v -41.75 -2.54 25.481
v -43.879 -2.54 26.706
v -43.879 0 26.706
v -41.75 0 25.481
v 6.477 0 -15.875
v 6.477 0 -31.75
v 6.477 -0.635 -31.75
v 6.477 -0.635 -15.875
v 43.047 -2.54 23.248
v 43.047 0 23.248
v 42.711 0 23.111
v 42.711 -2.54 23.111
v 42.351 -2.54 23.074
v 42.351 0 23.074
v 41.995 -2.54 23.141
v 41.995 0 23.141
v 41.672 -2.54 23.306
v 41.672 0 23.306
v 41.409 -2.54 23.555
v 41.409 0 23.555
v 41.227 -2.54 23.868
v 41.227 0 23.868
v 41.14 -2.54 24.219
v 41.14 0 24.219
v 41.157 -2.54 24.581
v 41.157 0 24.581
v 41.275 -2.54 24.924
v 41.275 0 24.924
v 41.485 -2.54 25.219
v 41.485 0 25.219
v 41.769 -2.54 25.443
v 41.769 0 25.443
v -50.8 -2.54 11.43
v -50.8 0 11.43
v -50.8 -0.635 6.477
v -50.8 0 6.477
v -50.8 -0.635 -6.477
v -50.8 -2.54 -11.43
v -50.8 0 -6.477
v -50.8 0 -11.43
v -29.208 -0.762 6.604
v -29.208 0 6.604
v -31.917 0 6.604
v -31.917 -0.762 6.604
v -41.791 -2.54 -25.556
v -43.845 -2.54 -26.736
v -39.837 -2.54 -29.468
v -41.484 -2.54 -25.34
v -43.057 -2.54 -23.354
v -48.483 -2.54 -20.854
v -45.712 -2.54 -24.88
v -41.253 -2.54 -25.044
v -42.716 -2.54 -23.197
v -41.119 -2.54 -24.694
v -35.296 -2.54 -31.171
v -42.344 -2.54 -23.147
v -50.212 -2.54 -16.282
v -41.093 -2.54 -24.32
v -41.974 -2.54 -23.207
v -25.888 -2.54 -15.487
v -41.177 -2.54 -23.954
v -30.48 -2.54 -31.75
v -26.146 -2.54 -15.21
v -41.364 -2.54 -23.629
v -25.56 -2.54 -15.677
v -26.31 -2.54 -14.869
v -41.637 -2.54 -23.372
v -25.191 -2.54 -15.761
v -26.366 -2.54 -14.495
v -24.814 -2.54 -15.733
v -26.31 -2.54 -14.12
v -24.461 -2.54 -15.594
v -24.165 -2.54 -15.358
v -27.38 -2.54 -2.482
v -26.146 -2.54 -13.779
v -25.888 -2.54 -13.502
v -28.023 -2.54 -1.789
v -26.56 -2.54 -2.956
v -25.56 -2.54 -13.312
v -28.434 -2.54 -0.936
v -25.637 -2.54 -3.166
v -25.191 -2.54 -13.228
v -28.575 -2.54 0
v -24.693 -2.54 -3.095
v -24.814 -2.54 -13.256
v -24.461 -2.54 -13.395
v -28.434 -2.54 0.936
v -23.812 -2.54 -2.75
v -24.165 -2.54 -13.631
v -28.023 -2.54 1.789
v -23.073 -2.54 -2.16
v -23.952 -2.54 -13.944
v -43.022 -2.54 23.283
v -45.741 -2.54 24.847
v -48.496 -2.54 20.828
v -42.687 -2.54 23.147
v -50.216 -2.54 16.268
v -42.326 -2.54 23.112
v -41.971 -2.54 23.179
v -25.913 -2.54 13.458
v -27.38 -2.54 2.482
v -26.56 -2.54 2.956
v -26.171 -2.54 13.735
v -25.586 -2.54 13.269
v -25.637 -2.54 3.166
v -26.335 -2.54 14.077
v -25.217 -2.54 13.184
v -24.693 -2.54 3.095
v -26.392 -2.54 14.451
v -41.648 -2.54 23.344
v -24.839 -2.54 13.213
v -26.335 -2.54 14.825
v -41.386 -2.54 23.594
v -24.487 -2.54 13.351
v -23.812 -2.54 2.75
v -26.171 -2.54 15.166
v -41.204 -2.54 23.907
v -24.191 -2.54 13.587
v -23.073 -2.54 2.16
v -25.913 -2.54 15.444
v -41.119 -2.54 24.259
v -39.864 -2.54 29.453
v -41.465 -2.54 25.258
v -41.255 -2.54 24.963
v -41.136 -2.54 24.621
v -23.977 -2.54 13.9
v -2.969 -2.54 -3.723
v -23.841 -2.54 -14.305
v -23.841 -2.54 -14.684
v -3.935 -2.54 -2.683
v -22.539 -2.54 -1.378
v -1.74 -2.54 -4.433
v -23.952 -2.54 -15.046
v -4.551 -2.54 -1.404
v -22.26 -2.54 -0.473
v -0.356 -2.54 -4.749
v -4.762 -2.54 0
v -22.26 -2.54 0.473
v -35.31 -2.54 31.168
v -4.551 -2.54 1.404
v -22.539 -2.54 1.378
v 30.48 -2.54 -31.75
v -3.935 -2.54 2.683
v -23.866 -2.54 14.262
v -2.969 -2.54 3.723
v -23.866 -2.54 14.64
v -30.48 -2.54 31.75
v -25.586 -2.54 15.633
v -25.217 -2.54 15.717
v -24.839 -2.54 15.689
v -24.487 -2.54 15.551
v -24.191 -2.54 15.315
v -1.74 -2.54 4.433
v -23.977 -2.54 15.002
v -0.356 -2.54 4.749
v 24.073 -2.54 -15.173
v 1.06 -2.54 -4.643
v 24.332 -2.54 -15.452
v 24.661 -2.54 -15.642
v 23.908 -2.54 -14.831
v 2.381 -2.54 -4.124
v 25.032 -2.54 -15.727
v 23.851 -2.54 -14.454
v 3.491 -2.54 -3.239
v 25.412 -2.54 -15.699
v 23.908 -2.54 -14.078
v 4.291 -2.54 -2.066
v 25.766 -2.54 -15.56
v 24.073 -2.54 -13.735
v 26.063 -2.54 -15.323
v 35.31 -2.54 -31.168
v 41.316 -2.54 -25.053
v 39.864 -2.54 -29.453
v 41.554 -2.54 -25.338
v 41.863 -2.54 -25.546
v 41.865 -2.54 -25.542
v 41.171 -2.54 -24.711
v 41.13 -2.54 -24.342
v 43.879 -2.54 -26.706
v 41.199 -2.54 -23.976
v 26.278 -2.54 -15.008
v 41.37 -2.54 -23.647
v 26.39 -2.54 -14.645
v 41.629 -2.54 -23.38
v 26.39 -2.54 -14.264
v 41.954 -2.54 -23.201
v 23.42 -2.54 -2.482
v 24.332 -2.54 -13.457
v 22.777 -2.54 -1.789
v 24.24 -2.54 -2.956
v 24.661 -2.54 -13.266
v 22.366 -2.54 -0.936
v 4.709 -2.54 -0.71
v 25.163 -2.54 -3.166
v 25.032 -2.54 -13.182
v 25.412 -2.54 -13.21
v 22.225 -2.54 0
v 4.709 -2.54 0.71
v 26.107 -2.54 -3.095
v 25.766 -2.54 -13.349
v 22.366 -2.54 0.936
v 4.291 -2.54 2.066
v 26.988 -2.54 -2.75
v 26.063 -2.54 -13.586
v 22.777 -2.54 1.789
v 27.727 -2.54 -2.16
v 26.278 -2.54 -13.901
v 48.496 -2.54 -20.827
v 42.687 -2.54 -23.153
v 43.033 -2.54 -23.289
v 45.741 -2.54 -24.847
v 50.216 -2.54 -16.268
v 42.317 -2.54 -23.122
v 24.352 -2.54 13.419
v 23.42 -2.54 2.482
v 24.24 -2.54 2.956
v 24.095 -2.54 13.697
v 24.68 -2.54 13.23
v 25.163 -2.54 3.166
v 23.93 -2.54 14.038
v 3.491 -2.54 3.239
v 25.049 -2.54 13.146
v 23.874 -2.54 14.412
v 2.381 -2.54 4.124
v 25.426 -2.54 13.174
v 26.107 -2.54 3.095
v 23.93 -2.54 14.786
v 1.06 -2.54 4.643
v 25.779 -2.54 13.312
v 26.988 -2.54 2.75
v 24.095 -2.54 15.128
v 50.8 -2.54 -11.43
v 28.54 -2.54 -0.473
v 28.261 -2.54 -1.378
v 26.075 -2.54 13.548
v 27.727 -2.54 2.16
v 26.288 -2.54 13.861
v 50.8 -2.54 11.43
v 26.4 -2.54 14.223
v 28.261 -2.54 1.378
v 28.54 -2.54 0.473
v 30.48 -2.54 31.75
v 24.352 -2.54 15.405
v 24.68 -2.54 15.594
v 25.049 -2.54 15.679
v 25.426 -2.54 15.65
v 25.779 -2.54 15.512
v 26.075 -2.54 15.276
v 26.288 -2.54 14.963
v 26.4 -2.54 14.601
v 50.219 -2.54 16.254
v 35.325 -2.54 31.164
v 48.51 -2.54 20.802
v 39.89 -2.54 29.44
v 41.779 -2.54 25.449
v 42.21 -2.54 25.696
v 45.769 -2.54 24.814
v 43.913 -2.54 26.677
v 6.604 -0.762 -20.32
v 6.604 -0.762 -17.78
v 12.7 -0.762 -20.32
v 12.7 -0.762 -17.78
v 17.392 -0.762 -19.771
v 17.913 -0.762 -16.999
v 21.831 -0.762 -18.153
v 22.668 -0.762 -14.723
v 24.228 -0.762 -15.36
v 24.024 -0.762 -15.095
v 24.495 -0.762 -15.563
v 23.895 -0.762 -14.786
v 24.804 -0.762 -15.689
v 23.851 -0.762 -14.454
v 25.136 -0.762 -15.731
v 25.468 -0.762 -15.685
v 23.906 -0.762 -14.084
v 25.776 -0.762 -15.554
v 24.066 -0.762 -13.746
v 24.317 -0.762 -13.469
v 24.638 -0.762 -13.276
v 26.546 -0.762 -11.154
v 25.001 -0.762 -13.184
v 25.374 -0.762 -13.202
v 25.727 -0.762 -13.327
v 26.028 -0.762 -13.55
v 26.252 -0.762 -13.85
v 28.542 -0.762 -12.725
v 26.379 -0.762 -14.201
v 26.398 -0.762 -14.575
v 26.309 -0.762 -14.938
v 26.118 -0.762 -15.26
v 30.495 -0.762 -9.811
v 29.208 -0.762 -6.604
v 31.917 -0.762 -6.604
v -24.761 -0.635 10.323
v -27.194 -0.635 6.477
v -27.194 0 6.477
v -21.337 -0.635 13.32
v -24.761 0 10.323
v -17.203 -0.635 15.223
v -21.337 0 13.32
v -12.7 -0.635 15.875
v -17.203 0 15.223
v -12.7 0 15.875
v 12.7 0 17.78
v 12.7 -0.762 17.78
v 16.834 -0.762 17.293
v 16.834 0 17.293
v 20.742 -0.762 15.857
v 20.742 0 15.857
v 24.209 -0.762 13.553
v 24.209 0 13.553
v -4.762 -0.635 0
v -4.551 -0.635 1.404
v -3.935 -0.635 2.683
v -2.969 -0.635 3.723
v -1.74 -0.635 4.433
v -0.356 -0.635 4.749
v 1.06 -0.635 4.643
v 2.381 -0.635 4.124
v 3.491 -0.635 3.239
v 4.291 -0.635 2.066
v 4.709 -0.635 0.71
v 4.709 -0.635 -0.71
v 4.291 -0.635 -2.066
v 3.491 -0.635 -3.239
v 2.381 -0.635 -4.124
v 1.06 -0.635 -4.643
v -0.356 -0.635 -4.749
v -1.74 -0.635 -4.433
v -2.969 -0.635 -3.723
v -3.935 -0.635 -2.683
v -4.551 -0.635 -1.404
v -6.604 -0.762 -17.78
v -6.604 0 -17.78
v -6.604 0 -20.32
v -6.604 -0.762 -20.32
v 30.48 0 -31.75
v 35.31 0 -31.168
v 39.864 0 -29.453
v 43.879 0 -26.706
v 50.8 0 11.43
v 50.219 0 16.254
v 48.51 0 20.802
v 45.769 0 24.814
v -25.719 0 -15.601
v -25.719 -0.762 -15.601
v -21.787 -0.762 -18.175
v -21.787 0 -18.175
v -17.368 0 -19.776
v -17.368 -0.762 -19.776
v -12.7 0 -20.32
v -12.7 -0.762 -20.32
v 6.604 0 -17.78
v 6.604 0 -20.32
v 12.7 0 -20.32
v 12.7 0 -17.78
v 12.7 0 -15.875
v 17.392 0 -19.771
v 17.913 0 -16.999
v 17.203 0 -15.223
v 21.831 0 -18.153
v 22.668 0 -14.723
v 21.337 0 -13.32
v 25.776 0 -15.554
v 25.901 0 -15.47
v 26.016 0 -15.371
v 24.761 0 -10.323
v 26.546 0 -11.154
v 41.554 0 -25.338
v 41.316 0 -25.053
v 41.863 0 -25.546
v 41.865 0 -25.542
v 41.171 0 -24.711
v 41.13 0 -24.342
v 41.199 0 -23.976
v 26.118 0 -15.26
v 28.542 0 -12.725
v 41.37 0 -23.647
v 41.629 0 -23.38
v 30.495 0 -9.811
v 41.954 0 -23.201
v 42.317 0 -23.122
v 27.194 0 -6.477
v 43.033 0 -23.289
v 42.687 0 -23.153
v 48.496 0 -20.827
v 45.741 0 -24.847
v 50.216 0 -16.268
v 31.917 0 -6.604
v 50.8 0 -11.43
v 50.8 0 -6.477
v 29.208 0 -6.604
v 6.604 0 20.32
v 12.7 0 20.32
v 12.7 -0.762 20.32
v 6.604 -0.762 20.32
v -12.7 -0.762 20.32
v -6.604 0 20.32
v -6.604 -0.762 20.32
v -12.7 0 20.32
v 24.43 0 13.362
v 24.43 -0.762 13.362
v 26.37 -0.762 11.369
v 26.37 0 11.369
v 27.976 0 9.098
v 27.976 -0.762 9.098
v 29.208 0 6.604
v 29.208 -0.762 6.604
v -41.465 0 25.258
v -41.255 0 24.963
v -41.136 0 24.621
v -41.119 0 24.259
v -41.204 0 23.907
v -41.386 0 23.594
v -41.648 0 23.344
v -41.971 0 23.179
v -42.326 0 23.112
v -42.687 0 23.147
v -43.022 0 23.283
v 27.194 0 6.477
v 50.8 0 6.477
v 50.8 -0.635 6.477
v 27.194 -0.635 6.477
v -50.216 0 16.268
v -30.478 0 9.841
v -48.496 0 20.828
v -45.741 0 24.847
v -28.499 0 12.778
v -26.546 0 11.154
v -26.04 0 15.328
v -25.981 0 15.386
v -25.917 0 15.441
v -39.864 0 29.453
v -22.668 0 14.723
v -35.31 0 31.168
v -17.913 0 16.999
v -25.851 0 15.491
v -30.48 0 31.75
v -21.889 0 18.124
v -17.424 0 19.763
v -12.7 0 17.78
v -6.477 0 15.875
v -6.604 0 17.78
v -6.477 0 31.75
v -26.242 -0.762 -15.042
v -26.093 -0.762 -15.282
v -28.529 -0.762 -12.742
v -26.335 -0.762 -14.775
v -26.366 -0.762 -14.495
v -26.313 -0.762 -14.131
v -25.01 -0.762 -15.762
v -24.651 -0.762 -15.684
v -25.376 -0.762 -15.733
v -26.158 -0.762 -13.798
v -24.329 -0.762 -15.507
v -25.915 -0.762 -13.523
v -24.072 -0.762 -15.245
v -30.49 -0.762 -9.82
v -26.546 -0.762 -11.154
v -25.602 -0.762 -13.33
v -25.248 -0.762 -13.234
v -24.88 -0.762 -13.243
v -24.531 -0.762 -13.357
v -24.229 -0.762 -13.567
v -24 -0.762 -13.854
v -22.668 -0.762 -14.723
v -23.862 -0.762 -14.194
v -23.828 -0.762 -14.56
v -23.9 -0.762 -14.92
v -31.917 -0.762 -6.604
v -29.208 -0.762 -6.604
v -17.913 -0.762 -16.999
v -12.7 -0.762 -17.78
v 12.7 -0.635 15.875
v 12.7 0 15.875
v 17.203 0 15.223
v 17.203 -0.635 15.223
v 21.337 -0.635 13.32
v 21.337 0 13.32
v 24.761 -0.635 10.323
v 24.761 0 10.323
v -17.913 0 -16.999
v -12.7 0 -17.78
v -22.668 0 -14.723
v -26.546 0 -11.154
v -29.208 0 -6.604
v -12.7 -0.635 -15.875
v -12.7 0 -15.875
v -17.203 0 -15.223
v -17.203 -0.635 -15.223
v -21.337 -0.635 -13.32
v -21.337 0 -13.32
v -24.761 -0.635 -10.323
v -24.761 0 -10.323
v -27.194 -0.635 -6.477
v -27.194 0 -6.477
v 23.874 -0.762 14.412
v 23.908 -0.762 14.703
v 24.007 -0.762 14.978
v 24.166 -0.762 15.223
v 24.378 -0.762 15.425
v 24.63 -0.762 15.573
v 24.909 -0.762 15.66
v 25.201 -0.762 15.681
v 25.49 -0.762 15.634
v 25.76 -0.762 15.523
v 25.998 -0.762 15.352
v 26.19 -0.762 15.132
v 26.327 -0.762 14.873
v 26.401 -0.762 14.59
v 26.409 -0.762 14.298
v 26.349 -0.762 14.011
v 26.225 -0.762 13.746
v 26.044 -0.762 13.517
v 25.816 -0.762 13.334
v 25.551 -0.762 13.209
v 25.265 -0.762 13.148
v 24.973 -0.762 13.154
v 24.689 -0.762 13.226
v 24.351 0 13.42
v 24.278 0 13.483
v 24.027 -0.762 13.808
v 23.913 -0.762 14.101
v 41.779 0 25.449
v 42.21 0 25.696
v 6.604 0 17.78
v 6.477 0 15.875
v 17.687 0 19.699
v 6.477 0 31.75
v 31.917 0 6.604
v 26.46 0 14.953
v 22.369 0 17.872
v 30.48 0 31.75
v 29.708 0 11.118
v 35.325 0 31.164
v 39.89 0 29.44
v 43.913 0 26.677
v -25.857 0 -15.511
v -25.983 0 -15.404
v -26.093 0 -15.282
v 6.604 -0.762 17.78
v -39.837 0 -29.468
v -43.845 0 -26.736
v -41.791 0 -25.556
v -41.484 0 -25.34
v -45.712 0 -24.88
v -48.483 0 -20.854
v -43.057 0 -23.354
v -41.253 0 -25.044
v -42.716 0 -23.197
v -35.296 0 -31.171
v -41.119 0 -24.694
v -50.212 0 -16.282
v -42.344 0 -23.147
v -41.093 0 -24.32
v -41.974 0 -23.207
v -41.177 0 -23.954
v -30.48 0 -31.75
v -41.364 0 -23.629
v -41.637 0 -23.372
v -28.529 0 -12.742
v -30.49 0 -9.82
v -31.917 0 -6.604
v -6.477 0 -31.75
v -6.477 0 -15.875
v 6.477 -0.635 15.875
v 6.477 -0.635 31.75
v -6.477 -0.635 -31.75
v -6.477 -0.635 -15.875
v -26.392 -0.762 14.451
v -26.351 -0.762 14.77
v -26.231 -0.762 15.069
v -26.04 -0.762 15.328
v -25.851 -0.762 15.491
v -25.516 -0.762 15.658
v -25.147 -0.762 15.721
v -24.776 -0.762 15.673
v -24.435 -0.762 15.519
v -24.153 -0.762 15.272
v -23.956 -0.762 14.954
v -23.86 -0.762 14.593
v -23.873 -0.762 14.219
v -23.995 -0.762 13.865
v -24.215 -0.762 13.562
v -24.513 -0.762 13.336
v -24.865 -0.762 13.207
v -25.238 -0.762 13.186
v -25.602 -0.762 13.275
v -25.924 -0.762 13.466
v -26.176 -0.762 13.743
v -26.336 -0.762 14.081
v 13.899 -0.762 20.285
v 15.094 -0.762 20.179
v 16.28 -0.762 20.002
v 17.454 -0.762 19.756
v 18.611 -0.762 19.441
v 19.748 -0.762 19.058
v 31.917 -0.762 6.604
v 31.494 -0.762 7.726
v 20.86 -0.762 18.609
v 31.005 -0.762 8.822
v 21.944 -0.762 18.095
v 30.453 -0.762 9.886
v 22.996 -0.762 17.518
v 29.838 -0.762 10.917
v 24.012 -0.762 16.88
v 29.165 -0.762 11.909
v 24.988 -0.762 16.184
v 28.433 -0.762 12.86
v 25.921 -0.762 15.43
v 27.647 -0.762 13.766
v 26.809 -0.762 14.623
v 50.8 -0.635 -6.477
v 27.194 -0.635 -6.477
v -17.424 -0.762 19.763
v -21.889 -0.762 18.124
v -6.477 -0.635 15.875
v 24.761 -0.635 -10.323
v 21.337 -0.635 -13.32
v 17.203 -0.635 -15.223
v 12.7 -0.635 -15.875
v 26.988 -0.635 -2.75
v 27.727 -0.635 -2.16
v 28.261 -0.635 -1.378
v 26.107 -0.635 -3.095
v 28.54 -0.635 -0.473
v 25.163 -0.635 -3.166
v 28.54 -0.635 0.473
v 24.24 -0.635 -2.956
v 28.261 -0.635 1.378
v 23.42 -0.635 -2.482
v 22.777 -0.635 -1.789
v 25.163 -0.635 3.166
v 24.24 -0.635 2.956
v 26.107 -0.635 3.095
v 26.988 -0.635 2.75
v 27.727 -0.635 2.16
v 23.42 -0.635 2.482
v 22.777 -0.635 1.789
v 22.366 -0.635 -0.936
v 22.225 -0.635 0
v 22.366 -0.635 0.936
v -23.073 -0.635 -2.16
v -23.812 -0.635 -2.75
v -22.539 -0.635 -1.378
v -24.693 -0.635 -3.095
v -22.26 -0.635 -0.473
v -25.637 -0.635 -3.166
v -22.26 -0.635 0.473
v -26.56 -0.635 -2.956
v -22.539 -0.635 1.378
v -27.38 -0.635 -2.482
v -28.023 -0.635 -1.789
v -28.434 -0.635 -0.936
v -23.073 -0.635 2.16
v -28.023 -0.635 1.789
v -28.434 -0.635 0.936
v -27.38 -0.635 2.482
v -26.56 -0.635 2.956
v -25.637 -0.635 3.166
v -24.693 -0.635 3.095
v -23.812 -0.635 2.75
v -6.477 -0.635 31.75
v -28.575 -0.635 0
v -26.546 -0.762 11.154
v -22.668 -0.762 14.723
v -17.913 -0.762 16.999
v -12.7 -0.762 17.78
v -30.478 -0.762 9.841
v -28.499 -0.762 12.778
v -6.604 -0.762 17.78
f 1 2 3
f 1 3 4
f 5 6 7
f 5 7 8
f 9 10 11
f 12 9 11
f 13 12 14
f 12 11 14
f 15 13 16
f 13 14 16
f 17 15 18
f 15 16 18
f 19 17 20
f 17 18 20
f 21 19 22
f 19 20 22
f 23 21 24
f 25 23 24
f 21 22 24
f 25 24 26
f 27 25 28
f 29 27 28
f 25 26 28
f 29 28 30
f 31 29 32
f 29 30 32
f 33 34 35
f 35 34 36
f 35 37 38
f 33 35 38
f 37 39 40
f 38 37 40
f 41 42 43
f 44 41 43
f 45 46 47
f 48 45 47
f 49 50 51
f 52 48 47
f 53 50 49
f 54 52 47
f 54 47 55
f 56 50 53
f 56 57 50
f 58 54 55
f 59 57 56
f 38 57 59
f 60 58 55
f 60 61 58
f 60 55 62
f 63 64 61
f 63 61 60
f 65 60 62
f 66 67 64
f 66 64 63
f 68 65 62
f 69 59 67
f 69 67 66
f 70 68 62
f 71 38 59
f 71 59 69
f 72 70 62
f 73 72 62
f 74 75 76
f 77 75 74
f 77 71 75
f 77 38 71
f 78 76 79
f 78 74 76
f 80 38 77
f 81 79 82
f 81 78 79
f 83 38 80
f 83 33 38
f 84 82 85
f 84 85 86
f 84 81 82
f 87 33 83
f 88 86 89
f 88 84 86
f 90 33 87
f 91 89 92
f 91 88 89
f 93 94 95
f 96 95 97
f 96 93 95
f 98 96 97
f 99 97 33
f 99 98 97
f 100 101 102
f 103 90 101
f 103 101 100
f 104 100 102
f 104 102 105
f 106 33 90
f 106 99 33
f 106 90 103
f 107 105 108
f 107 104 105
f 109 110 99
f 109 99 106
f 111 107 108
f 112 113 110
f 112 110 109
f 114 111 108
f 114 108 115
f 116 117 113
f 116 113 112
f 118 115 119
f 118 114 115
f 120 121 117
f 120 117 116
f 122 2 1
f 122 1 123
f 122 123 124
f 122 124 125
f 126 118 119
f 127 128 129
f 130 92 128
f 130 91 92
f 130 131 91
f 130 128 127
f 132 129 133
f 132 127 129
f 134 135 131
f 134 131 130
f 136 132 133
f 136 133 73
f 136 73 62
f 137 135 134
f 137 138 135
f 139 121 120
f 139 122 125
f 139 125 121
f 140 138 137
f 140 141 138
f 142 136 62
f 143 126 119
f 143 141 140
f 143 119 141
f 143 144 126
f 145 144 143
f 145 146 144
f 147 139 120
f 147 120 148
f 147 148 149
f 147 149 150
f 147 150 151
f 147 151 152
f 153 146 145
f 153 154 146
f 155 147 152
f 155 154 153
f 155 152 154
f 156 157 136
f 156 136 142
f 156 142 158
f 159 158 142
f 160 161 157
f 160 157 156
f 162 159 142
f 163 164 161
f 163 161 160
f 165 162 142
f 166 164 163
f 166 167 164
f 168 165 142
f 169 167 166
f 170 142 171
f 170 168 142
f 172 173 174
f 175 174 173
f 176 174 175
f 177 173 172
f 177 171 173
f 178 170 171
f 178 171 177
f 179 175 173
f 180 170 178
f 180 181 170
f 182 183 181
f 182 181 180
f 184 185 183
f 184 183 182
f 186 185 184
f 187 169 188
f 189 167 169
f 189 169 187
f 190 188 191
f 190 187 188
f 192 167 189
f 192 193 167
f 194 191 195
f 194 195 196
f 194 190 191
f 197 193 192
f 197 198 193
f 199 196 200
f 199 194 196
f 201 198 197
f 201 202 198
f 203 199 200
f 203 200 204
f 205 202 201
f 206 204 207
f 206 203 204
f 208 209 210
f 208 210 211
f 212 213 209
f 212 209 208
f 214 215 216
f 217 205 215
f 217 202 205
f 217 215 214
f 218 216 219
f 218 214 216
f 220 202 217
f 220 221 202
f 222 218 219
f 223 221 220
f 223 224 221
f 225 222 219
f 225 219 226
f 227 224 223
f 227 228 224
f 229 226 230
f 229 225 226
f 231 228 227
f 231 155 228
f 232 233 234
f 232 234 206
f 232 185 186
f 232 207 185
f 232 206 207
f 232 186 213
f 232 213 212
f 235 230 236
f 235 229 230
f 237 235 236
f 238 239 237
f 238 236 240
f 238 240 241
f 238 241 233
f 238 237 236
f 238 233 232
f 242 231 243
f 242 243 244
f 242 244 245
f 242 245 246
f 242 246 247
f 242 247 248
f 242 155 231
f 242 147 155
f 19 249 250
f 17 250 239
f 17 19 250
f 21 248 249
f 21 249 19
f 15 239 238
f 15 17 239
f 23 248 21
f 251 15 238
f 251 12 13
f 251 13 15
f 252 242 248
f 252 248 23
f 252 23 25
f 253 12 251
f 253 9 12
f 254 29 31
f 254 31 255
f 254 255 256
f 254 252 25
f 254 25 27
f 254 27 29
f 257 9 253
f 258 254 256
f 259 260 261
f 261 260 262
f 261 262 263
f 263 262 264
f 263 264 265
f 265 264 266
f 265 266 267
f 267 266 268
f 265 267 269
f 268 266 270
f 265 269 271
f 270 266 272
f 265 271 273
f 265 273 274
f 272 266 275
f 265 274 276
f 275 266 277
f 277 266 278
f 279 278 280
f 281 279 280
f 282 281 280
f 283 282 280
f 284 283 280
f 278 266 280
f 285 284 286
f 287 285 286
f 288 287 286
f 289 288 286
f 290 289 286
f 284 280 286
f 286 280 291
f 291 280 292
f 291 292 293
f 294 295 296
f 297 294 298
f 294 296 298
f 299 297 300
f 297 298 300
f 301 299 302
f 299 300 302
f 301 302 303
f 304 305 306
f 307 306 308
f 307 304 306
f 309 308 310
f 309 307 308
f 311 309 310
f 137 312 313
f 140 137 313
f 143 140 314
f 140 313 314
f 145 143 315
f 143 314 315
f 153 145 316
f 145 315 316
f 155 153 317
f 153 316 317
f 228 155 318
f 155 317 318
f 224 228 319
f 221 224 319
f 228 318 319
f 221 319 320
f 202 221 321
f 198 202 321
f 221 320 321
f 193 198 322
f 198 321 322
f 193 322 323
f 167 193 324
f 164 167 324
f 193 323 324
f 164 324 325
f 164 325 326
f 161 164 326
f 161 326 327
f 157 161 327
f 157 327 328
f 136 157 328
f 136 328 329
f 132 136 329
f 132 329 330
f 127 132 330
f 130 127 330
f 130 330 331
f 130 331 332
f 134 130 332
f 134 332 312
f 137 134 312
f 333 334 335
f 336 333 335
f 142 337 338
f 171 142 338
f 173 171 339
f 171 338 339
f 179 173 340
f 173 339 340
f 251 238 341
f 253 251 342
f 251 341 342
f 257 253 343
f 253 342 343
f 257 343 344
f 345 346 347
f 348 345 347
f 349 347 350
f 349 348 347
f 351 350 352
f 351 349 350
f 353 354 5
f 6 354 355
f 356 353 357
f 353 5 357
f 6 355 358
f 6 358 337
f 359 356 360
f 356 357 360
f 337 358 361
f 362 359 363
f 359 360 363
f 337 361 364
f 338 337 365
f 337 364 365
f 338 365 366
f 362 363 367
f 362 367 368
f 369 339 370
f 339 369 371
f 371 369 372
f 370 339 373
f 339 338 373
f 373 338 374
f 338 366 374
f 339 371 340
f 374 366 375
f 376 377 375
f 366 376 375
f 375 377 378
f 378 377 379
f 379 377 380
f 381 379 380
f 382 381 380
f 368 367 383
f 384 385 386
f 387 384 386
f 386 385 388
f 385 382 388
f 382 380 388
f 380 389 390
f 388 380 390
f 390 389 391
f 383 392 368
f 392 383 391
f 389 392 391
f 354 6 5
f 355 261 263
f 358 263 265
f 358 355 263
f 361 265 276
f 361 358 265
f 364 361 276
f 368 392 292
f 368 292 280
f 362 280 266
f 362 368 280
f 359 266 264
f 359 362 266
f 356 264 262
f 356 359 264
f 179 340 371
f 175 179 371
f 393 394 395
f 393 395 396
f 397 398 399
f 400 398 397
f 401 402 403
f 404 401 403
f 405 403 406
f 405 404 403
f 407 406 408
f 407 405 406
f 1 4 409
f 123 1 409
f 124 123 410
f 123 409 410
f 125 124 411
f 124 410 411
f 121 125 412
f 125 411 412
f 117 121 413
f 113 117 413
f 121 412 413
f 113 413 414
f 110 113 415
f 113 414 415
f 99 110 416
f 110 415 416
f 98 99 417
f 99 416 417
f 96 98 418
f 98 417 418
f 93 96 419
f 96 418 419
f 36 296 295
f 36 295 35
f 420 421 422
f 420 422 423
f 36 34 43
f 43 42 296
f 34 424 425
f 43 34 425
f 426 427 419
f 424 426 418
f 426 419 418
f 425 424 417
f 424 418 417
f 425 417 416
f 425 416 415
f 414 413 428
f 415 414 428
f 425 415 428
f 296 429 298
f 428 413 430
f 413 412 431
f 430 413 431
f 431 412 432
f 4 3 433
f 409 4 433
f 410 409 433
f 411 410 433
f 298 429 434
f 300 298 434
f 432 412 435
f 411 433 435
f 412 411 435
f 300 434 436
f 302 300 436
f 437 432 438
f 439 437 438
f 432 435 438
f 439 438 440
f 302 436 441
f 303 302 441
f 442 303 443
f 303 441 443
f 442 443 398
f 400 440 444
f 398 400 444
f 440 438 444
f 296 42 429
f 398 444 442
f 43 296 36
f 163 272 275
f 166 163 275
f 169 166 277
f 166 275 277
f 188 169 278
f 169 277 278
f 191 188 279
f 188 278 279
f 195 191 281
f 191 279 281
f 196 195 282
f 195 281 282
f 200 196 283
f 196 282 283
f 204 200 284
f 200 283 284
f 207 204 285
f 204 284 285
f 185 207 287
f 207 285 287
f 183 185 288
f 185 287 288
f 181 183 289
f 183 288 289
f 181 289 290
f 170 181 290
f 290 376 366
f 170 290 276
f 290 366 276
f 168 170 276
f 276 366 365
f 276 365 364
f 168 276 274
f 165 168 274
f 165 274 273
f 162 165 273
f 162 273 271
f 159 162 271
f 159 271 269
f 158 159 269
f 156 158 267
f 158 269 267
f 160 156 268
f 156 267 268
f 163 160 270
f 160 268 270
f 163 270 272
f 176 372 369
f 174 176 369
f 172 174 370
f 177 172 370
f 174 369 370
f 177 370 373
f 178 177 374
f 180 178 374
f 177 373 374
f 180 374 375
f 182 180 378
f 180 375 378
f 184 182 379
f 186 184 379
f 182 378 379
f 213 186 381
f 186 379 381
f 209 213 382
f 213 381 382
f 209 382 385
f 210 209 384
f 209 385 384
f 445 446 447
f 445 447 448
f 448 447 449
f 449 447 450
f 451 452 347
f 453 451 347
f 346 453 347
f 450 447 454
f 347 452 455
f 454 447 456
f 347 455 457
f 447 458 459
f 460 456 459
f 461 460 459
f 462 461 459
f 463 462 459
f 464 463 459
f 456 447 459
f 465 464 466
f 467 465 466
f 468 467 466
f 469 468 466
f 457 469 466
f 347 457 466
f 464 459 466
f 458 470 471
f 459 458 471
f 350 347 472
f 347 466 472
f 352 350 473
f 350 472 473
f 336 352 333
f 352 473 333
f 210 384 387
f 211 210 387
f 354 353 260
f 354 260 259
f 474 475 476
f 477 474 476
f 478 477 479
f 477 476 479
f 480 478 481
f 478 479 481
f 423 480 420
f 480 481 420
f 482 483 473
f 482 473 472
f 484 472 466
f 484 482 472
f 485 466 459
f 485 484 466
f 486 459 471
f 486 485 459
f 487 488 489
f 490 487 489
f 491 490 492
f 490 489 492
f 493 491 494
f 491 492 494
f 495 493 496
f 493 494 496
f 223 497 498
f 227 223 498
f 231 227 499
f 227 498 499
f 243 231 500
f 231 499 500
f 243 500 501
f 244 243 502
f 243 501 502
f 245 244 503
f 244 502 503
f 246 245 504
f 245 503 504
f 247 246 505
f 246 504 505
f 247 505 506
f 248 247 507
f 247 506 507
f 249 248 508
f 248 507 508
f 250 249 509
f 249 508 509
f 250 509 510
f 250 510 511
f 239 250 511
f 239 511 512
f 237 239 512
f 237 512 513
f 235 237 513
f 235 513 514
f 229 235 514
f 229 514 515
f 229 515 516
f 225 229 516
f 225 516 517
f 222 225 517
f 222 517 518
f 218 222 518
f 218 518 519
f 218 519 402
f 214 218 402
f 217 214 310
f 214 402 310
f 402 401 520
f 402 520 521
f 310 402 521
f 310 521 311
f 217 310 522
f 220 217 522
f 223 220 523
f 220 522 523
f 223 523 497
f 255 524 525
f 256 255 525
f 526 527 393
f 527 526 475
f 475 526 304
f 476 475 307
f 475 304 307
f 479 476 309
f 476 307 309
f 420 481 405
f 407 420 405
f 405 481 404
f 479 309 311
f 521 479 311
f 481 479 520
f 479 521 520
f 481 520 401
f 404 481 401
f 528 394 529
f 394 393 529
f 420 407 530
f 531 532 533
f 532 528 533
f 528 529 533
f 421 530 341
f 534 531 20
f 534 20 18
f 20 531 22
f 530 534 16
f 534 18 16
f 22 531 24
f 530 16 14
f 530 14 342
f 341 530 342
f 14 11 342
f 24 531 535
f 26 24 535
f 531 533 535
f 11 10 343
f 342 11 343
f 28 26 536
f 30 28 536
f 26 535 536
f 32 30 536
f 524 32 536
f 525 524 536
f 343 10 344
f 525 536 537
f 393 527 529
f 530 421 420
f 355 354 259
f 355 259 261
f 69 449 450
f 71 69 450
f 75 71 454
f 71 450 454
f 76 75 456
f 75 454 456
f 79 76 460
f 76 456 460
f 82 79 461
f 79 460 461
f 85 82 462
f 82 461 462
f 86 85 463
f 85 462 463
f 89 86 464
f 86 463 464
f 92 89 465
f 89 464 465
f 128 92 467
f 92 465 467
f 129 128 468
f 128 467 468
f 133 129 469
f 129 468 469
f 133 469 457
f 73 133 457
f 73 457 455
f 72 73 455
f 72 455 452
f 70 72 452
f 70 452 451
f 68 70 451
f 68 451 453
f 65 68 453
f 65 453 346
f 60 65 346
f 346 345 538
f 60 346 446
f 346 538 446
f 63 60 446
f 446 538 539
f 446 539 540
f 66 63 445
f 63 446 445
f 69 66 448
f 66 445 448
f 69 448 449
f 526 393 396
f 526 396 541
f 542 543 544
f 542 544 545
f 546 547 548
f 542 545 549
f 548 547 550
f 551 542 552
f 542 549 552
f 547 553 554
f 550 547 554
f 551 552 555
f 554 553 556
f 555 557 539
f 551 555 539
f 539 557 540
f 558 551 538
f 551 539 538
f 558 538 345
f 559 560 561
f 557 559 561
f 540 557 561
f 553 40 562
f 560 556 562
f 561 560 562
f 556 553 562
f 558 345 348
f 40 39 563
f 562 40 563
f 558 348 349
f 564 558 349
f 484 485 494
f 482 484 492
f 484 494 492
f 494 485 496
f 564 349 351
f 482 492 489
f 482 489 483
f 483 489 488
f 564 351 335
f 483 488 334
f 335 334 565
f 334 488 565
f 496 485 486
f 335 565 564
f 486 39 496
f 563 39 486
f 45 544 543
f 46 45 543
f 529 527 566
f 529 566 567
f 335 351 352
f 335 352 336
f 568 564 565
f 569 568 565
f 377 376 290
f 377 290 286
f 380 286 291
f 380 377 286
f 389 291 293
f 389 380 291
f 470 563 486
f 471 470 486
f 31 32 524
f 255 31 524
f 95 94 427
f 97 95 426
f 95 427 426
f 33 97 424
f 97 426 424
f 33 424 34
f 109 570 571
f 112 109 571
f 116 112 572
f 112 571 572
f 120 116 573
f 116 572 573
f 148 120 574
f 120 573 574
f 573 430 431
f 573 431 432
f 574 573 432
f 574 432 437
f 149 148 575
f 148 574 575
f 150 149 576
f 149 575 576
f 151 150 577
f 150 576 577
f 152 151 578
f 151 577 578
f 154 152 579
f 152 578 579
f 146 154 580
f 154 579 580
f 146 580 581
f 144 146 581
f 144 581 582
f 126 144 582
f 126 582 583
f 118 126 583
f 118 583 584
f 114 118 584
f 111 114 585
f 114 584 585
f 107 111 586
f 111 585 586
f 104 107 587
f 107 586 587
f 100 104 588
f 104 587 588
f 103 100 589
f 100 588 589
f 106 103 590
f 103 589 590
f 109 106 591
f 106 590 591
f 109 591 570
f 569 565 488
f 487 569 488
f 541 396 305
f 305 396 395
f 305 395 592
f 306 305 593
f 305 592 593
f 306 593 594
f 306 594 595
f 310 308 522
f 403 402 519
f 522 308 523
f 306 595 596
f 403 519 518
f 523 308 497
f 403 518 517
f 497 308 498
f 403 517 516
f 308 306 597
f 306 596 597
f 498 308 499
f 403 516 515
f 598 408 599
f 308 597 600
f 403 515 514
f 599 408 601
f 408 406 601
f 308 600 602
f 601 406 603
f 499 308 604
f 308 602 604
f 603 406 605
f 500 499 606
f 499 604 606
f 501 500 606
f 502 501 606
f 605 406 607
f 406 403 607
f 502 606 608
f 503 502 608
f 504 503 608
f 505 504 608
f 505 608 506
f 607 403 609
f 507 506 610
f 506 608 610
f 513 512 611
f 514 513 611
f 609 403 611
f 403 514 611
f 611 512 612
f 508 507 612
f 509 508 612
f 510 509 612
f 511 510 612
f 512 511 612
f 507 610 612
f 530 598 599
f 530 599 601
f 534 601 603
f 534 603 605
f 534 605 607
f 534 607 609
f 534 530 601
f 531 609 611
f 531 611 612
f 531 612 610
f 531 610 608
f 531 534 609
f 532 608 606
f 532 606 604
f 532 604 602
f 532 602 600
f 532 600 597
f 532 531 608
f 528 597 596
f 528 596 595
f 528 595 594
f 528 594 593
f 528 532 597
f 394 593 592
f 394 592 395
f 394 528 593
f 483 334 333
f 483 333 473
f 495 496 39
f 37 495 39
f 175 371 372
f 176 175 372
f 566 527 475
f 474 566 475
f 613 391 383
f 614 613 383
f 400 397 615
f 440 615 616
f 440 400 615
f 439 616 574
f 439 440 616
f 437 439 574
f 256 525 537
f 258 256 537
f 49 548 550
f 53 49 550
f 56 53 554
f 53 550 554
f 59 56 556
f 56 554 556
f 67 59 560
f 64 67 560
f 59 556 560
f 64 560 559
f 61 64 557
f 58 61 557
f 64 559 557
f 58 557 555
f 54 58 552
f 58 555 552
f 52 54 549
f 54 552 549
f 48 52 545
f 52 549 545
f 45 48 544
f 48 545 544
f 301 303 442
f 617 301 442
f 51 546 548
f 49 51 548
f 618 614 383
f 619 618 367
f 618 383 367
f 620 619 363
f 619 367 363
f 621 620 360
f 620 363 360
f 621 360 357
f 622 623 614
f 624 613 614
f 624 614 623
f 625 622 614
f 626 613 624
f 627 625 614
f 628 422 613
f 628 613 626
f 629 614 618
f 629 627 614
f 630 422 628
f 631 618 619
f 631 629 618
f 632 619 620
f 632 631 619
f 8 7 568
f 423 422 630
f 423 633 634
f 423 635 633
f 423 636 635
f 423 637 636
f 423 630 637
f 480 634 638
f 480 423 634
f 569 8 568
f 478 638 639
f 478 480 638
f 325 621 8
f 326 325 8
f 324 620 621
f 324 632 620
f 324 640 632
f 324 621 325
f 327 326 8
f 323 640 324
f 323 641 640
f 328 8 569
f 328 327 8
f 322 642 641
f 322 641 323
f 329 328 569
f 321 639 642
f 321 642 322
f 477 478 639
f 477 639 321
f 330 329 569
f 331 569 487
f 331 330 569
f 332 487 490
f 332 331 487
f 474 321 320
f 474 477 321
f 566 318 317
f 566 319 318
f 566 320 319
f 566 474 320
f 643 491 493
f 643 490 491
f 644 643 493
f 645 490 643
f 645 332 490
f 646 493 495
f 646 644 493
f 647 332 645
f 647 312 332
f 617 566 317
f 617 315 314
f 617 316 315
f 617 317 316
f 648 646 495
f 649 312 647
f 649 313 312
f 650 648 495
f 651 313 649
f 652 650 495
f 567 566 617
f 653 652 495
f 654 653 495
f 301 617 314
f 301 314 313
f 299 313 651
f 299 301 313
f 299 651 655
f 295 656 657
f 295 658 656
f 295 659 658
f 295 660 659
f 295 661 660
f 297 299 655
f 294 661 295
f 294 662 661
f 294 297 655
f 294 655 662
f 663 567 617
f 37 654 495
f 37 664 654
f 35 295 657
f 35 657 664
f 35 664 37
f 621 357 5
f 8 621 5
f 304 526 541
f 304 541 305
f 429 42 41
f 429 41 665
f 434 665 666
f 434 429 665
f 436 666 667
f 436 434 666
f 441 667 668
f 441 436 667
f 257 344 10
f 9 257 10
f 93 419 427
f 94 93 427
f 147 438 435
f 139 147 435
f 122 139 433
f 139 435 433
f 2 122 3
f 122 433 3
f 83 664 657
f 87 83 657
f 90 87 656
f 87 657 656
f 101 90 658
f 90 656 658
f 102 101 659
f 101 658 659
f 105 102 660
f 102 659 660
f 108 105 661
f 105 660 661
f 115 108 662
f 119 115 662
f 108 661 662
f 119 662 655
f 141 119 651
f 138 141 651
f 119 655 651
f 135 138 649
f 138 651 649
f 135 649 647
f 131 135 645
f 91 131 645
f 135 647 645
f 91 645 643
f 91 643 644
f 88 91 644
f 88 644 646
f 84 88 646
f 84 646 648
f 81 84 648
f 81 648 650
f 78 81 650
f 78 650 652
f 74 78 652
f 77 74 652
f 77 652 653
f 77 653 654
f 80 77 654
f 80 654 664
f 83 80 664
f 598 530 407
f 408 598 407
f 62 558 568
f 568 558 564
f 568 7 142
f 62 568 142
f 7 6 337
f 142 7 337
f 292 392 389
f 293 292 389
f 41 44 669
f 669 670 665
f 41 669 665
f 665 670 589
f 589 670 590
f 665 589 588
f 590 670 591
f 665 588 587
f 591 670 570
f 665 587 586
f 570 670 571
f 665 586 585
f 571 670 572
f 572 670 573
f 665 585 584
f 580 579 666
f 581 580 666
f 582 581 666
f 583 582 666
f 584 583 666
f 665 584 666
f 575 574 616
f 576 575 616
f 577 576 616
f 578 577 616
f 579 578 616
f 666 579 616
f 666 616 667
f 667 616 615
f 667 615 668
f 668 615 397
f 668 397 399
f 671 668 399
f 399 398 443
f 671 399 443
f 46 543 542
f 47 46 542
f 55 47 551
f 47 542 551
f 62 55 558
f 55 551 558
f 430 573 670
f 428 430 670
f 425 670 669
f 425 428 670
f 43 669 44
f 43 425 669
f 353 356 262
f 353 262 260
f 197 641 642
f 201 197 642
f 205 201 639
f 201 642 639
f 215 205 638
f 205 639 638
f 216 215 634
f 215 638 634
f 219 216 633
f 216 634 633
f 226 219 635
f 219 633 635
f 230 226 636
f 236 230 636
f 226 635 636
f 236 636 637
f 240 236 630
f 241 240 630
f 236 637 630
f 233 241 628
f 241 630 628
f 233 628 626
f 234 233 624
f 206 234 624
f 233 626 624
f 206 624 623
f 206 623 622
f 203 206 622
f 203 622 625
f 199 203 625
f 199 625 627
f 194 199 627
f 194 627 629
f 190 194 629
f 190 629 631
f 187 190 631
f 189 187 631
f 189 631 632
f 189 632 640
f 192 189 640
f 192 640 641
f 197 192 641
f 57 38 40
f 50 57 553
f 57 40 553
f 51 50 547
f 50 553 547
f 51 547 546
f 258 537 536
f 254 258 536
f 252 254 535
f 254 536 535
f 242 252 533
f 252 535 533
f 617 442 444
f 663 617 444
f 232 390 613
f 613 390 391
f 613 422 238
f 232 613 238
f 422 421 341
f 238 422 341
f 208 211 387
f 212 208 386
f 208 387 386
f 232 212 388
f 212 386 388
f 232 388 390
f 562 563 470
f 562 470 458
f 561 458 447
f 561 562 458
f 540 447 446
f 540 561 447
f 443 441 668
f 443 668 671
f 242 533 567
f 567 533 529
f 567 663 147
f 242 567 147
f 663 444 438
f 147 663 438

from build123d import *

# Parameters (mm, degrees)
F1_DEPTH  = 2.54
F3_DEPTH  = 12.7
F5_DEPTH  = 52.071
F7_DEPTH  = 76.2
F9_DEPTH  = 25.4
F10_W     = 50.673
F10_H     = 12.954
F10_W_2   = 12.954
F10_H_2   = 37.973
F11_DEPTH = 0.635
F12_DEPTH = 13.462
F14_DEPTH = 1.905
F15_R     = 4.7625
F15_R_2   = 3.175
F16_DEPTH = 25.4
F17_R     = 1.2763153823
F17_R_2   = 1.27
F18_DEPTH = 25.4


# Not quite as in the source:
# - ends of sketch curves that miss each other by under 0.0002 mm in the source are joined


with BuildPart() as f1:
    # F0 (on Front) → F1 (new body)
    with BuildSketch(Plane.XZ):
        with BuildLine():
            Line((30.48, 31.75), (-30.48, 31.75))
            ThreePointArc((-30.48, 31.75), (-44.8484097937, 25.7984097937), (-50.8, 11.43))
            Line((-50.8, 11.43), (-50.8, -11.43))
            ThreePointArc((-50.8, -11.43), (-44.8484097937, -25.7984097937), (-30.48, -31.75))
            Line((-30.48, -31.75), (30.48, -31.75))
            ThreePointArc((30.48, -31.75), (44.8484097937, -25.7984097937), (50.8, -11.43))
            Line((50.8, -11.43), (50.8, 11.43))
            ThreePointArc((50.8, 11.43), (44.8484097937, 25.7984097937), (30.48, 31.75))
        make_face()
    extrude(amount=F1_DEPTH)

    # F2 (on Front) → F3 (join)
    with BuildSketch(Plane.XZ):
        with BuildLine():
            ThreePointArc((33.02, 0), (27.0684097937, 14.3684097937), (12.7, 20.32))
            Line((12.7, 20.32), (-12.7, 20.32))
            ThreePointArc((-12.7, 20.32), (-27.0684097937, 14.3684097937), (-33.02, 0))
            ThreePointArc((-33.02, 0), (-27.0684097937, -14.3684097937), (-12.7, -20.32))
            Line((-12.7, -20.32), (12.7, -20.32))
            ThreePointArc((12.7, -20.32), (27.0684097937, -14.3684097937), (33.02, 0))
        make_face()
        with BuildLine():
            ThreePointArc((-30.48, 0), (-25.2723585695, 12.5723585695), (-12.7, 17.78))
            Line((-12.7, 17.78), (12.7, 17.78))
            ThreePointArc((12.7, 17.78), (25.2723585695, 12.5723585695), (30.48, 0))
            ThreePointArc((30.48, 0), (25.2723585695, -12.5723585695), (12.7, -17.78))
            Line((12.7, -17.78), (-12.7, -17.78))
            ThreePointArc((-12.7, -17.78), (-25.2723585695, -12.5723585695), (-30.48, 0))
        make_face(mode=Mode.SUBTRACT)
    extrude(amount=-F3_DEPTH)

    # F4 (on face) → F5 (cut, through all)
    with BuildSketch(Plane.XY.offset(20.32)):
        Polygon((6.604, 12.7), (0, 12.7), (-6.604, 12.7), (-6.604, 0), (6.604, 0), align=None)
    extrude(amount=-F5_DEPTH, mode=Mode.SUBTRACT)

    # F6 (on Right) → F7 (cut, symmetric)
    with BuildSketch(Plane.YZ):
        Polygon((0, 6.604), (0, 0), (0, -6.604), (12.7, -6.604), (12.7, 6.604), align=None)
    extrude(amount=F7_DEPTH, both=True, mode=Mode.SUBTRACT)

    # F8 (on face) → F9 (cut)
    with BuildSketch(Plane(origin=(0, 0, 0), x_dir=(-1, 0, 0), z_dir=(0, 1, 0))):
        with BuildLine():
            Line((12.7, 15.875), (-12.7, 15.875))
            ThreePointArc((-12.7, 15.875), (-23.9253201513, 11.2253201513), (-28.575, 0))
            ThreePointArc((-28.575, 0), (-23.9253201513, -11.2253201513), (-12.7, -15.875))
            Line((-12.7, -15.875), (12.7, -15.875))
            ThreePointArc((12.7, -15.875), (23.9253201513, -11.2253201513), (28.575, 0))
            ThreePointArc((28.575, 0), (23.9253201513, 11.2253201513), (12.7, 15.875))
        make_face()
    extrude(amount=-F9_DEPTH, mode=Mode.SUBTRACT)

    # F10 (on face) → F11 (cut)
    with BuildSketch(Plane(origin=(0, 0, 0), x_dir=(-1, 0, 0), z_dir=(0, 1, 0))):
        with Locations((-31.8135, 0)):
            Rectangle(F10_W, F10_H)
        with Locations((0, 25.4635)):
            Rectangle(F10_W_2, F10_H_2)
        Rectangle(F10_W_2, F10_H)
        with Locations((31.8135, 0)):
            Rectangle(F10_W, F10_H)
        with Locations((0, -25.4635)):
            Rectangle(F10_W_2, F10_H_2)
    extrude(amount=-F11_DEPTH, mode=Mode.SUBTRACT)

    # F12 (cut): faces of the model
    f12_faces = [f1.faces().sort_by_distance(p)[0] for p in [
        (9.652, 12.7, -20.0320986266),
        (30.5624774214, 12.7, 6.8919013734),
        (-30.5624774214, 12.7, -6.8919013734),
        (-6.8919013734, 12.7, 19.05),
    ]]
    extrude(f12_faces, amount=-F12_DEPTH, mode=Mode.SUBTRACT)

    # F13 (on face) → F14 (join)
    with BuildSketch(Plane.XZ.offset(2.54)):
        with BuildLine():
            Line((-12.7, -15.875), (12.7, -15.875))
            ThreePointArc((12.7, -15.875), (23.9253201513, -11.2253201513), (28.575, 0))
            ThreePointArc((28.575, 0), (23.9253201513, 11.2253201513), (12.7, 15.875))
            Line((12.7, 15.875), (-12.7, 15.875))
            ThreePointArc((-12.7, 15.875), (-23.9253201513, 11.2253201513), (-28.575, 0))
            ThreePointArc((-28.575, 0), (-23.9253201513, -11.2253201513), (-12.7, -15.875))
        make_face()
    extrude(amount=-F14_DEPTH)

    # F15 (on face) → F16 (cut)
    with BuildSketch(Plane(origin=(0, -0.635, 0), x_dir=(-1, 0, 0), z_dir=(0, 1, 0))):
        Circle(F15_R)
        with Locations((-25.4, 0)):
            Circle(F15_R_2)
        with Locations((25.4, 0)):
            Circle(F15_R_2)
    extrude(amount=-F16_DEPTH, mode=Mode.SUBTRACT)

    # F17 (on face) → F18 (cut)
    with BuildSketch(Plane(origin=(0, 0, 0), x_dir=(-1, 0, 0), z_dir=(0, 1, 0))):
        Polygon((47.6680542115, -27.4815886288), (51.1667876586, -29.4946501669), (47.6696745814, -27.4787697193), align=None)
        with BuildLine():
            Line((47.0404791933, -28.5733623005), (47.6680542115, -27.4815886288))
            Line((47.6680542115, -27.4815886288), (47.6696745814, -27.4787697193))
            Line((47.6696745814, -27.4787697193), (48.3063004883, -26.3712504847))
            Line((48.3063004883, -26.3712504847), (43.0570225864, -23.3538525016))
            ThreePointArc((43.0570225864, -23.3538525016), (41.2580877478, -23.7846525937), (41.7912012914, -25.5559643173))
            Line((41.7912012914, -25.5559643173), (47.0404791933, -28.5733623005))
        make_face()
        with Locations((-25.1277598759, -14.4543864422)):
            Circle(F17_R)
        with Locations((-25.1438466209, 14.4120964147)):
            Circle(F17_R_2)
        with Locations((25.1215984181, 14.4508421512)):
            Circle(F17_R_2)
        with Locations((25.0963969645, -14.4945646834)):
            Circle(F17_R_2)
        with BuildLine():
            ThreePointArc((-41.8649914427, -25.5417502167), (-41.2719571065, -23.8052669732), (-43.0327445767, -23.2888453782))
            Line((-43.0327445767, -23.2888453782), (-48.1358024341, -26.2243068229))
            Line((-48.1358024341, -26.2243068229), (-46.8692956724, -28.4260244757))
            Line((-46.8692956724, -28.4260244757), (-41.8629335005, -25.5461858486))
            Line((-41.8629335005, -25.5461858486), (-41.8649914427, -25.5417502167))
        make_face()
        with BuildLine():
            ThreePointArc((-43.0465700311, 23.2475518967), (-41.3065716807, 23.7045275153), (-41.7691664779, 25.443040394))
            Line((-41.7691664779, 25.443040394), (-41.7793320219, 25.4488488271))
            Line((-41.7793320219, 25.4488488271), (-42.2095022754, 25.6963553049))
            Line((-42.2095022754, 25.6963553049), (-46.0359033246, 27.8979465087))
            Line((-46.0359033246, 27.8979465087), (-47.302629882, 25.6963553049))
            Line((-47.302629882, 25.6963553049), (-43.0465700311, 23.2475518967))
        make_face()
        with BuildLine():
            Line((46.6254135383, 28.2857347472), (41.7498114349, 25.4811139895))
            ThreePointArc((41.7498114349, 25.4811139895), (41.2839564144, 23.7439684966), (43.0223799296, 23.2829055446))
            Line((43.0223799296, 23.2829055446), (47.8919203, 26.0840170944))
            Line((47.8919203, 26.0840170944), (46.6254135383, 28.2857347472))
        make_face()
    extrude(amount=-F18_DEPTH, mode=Mode.SUBTRACT)


solid = f1.part
